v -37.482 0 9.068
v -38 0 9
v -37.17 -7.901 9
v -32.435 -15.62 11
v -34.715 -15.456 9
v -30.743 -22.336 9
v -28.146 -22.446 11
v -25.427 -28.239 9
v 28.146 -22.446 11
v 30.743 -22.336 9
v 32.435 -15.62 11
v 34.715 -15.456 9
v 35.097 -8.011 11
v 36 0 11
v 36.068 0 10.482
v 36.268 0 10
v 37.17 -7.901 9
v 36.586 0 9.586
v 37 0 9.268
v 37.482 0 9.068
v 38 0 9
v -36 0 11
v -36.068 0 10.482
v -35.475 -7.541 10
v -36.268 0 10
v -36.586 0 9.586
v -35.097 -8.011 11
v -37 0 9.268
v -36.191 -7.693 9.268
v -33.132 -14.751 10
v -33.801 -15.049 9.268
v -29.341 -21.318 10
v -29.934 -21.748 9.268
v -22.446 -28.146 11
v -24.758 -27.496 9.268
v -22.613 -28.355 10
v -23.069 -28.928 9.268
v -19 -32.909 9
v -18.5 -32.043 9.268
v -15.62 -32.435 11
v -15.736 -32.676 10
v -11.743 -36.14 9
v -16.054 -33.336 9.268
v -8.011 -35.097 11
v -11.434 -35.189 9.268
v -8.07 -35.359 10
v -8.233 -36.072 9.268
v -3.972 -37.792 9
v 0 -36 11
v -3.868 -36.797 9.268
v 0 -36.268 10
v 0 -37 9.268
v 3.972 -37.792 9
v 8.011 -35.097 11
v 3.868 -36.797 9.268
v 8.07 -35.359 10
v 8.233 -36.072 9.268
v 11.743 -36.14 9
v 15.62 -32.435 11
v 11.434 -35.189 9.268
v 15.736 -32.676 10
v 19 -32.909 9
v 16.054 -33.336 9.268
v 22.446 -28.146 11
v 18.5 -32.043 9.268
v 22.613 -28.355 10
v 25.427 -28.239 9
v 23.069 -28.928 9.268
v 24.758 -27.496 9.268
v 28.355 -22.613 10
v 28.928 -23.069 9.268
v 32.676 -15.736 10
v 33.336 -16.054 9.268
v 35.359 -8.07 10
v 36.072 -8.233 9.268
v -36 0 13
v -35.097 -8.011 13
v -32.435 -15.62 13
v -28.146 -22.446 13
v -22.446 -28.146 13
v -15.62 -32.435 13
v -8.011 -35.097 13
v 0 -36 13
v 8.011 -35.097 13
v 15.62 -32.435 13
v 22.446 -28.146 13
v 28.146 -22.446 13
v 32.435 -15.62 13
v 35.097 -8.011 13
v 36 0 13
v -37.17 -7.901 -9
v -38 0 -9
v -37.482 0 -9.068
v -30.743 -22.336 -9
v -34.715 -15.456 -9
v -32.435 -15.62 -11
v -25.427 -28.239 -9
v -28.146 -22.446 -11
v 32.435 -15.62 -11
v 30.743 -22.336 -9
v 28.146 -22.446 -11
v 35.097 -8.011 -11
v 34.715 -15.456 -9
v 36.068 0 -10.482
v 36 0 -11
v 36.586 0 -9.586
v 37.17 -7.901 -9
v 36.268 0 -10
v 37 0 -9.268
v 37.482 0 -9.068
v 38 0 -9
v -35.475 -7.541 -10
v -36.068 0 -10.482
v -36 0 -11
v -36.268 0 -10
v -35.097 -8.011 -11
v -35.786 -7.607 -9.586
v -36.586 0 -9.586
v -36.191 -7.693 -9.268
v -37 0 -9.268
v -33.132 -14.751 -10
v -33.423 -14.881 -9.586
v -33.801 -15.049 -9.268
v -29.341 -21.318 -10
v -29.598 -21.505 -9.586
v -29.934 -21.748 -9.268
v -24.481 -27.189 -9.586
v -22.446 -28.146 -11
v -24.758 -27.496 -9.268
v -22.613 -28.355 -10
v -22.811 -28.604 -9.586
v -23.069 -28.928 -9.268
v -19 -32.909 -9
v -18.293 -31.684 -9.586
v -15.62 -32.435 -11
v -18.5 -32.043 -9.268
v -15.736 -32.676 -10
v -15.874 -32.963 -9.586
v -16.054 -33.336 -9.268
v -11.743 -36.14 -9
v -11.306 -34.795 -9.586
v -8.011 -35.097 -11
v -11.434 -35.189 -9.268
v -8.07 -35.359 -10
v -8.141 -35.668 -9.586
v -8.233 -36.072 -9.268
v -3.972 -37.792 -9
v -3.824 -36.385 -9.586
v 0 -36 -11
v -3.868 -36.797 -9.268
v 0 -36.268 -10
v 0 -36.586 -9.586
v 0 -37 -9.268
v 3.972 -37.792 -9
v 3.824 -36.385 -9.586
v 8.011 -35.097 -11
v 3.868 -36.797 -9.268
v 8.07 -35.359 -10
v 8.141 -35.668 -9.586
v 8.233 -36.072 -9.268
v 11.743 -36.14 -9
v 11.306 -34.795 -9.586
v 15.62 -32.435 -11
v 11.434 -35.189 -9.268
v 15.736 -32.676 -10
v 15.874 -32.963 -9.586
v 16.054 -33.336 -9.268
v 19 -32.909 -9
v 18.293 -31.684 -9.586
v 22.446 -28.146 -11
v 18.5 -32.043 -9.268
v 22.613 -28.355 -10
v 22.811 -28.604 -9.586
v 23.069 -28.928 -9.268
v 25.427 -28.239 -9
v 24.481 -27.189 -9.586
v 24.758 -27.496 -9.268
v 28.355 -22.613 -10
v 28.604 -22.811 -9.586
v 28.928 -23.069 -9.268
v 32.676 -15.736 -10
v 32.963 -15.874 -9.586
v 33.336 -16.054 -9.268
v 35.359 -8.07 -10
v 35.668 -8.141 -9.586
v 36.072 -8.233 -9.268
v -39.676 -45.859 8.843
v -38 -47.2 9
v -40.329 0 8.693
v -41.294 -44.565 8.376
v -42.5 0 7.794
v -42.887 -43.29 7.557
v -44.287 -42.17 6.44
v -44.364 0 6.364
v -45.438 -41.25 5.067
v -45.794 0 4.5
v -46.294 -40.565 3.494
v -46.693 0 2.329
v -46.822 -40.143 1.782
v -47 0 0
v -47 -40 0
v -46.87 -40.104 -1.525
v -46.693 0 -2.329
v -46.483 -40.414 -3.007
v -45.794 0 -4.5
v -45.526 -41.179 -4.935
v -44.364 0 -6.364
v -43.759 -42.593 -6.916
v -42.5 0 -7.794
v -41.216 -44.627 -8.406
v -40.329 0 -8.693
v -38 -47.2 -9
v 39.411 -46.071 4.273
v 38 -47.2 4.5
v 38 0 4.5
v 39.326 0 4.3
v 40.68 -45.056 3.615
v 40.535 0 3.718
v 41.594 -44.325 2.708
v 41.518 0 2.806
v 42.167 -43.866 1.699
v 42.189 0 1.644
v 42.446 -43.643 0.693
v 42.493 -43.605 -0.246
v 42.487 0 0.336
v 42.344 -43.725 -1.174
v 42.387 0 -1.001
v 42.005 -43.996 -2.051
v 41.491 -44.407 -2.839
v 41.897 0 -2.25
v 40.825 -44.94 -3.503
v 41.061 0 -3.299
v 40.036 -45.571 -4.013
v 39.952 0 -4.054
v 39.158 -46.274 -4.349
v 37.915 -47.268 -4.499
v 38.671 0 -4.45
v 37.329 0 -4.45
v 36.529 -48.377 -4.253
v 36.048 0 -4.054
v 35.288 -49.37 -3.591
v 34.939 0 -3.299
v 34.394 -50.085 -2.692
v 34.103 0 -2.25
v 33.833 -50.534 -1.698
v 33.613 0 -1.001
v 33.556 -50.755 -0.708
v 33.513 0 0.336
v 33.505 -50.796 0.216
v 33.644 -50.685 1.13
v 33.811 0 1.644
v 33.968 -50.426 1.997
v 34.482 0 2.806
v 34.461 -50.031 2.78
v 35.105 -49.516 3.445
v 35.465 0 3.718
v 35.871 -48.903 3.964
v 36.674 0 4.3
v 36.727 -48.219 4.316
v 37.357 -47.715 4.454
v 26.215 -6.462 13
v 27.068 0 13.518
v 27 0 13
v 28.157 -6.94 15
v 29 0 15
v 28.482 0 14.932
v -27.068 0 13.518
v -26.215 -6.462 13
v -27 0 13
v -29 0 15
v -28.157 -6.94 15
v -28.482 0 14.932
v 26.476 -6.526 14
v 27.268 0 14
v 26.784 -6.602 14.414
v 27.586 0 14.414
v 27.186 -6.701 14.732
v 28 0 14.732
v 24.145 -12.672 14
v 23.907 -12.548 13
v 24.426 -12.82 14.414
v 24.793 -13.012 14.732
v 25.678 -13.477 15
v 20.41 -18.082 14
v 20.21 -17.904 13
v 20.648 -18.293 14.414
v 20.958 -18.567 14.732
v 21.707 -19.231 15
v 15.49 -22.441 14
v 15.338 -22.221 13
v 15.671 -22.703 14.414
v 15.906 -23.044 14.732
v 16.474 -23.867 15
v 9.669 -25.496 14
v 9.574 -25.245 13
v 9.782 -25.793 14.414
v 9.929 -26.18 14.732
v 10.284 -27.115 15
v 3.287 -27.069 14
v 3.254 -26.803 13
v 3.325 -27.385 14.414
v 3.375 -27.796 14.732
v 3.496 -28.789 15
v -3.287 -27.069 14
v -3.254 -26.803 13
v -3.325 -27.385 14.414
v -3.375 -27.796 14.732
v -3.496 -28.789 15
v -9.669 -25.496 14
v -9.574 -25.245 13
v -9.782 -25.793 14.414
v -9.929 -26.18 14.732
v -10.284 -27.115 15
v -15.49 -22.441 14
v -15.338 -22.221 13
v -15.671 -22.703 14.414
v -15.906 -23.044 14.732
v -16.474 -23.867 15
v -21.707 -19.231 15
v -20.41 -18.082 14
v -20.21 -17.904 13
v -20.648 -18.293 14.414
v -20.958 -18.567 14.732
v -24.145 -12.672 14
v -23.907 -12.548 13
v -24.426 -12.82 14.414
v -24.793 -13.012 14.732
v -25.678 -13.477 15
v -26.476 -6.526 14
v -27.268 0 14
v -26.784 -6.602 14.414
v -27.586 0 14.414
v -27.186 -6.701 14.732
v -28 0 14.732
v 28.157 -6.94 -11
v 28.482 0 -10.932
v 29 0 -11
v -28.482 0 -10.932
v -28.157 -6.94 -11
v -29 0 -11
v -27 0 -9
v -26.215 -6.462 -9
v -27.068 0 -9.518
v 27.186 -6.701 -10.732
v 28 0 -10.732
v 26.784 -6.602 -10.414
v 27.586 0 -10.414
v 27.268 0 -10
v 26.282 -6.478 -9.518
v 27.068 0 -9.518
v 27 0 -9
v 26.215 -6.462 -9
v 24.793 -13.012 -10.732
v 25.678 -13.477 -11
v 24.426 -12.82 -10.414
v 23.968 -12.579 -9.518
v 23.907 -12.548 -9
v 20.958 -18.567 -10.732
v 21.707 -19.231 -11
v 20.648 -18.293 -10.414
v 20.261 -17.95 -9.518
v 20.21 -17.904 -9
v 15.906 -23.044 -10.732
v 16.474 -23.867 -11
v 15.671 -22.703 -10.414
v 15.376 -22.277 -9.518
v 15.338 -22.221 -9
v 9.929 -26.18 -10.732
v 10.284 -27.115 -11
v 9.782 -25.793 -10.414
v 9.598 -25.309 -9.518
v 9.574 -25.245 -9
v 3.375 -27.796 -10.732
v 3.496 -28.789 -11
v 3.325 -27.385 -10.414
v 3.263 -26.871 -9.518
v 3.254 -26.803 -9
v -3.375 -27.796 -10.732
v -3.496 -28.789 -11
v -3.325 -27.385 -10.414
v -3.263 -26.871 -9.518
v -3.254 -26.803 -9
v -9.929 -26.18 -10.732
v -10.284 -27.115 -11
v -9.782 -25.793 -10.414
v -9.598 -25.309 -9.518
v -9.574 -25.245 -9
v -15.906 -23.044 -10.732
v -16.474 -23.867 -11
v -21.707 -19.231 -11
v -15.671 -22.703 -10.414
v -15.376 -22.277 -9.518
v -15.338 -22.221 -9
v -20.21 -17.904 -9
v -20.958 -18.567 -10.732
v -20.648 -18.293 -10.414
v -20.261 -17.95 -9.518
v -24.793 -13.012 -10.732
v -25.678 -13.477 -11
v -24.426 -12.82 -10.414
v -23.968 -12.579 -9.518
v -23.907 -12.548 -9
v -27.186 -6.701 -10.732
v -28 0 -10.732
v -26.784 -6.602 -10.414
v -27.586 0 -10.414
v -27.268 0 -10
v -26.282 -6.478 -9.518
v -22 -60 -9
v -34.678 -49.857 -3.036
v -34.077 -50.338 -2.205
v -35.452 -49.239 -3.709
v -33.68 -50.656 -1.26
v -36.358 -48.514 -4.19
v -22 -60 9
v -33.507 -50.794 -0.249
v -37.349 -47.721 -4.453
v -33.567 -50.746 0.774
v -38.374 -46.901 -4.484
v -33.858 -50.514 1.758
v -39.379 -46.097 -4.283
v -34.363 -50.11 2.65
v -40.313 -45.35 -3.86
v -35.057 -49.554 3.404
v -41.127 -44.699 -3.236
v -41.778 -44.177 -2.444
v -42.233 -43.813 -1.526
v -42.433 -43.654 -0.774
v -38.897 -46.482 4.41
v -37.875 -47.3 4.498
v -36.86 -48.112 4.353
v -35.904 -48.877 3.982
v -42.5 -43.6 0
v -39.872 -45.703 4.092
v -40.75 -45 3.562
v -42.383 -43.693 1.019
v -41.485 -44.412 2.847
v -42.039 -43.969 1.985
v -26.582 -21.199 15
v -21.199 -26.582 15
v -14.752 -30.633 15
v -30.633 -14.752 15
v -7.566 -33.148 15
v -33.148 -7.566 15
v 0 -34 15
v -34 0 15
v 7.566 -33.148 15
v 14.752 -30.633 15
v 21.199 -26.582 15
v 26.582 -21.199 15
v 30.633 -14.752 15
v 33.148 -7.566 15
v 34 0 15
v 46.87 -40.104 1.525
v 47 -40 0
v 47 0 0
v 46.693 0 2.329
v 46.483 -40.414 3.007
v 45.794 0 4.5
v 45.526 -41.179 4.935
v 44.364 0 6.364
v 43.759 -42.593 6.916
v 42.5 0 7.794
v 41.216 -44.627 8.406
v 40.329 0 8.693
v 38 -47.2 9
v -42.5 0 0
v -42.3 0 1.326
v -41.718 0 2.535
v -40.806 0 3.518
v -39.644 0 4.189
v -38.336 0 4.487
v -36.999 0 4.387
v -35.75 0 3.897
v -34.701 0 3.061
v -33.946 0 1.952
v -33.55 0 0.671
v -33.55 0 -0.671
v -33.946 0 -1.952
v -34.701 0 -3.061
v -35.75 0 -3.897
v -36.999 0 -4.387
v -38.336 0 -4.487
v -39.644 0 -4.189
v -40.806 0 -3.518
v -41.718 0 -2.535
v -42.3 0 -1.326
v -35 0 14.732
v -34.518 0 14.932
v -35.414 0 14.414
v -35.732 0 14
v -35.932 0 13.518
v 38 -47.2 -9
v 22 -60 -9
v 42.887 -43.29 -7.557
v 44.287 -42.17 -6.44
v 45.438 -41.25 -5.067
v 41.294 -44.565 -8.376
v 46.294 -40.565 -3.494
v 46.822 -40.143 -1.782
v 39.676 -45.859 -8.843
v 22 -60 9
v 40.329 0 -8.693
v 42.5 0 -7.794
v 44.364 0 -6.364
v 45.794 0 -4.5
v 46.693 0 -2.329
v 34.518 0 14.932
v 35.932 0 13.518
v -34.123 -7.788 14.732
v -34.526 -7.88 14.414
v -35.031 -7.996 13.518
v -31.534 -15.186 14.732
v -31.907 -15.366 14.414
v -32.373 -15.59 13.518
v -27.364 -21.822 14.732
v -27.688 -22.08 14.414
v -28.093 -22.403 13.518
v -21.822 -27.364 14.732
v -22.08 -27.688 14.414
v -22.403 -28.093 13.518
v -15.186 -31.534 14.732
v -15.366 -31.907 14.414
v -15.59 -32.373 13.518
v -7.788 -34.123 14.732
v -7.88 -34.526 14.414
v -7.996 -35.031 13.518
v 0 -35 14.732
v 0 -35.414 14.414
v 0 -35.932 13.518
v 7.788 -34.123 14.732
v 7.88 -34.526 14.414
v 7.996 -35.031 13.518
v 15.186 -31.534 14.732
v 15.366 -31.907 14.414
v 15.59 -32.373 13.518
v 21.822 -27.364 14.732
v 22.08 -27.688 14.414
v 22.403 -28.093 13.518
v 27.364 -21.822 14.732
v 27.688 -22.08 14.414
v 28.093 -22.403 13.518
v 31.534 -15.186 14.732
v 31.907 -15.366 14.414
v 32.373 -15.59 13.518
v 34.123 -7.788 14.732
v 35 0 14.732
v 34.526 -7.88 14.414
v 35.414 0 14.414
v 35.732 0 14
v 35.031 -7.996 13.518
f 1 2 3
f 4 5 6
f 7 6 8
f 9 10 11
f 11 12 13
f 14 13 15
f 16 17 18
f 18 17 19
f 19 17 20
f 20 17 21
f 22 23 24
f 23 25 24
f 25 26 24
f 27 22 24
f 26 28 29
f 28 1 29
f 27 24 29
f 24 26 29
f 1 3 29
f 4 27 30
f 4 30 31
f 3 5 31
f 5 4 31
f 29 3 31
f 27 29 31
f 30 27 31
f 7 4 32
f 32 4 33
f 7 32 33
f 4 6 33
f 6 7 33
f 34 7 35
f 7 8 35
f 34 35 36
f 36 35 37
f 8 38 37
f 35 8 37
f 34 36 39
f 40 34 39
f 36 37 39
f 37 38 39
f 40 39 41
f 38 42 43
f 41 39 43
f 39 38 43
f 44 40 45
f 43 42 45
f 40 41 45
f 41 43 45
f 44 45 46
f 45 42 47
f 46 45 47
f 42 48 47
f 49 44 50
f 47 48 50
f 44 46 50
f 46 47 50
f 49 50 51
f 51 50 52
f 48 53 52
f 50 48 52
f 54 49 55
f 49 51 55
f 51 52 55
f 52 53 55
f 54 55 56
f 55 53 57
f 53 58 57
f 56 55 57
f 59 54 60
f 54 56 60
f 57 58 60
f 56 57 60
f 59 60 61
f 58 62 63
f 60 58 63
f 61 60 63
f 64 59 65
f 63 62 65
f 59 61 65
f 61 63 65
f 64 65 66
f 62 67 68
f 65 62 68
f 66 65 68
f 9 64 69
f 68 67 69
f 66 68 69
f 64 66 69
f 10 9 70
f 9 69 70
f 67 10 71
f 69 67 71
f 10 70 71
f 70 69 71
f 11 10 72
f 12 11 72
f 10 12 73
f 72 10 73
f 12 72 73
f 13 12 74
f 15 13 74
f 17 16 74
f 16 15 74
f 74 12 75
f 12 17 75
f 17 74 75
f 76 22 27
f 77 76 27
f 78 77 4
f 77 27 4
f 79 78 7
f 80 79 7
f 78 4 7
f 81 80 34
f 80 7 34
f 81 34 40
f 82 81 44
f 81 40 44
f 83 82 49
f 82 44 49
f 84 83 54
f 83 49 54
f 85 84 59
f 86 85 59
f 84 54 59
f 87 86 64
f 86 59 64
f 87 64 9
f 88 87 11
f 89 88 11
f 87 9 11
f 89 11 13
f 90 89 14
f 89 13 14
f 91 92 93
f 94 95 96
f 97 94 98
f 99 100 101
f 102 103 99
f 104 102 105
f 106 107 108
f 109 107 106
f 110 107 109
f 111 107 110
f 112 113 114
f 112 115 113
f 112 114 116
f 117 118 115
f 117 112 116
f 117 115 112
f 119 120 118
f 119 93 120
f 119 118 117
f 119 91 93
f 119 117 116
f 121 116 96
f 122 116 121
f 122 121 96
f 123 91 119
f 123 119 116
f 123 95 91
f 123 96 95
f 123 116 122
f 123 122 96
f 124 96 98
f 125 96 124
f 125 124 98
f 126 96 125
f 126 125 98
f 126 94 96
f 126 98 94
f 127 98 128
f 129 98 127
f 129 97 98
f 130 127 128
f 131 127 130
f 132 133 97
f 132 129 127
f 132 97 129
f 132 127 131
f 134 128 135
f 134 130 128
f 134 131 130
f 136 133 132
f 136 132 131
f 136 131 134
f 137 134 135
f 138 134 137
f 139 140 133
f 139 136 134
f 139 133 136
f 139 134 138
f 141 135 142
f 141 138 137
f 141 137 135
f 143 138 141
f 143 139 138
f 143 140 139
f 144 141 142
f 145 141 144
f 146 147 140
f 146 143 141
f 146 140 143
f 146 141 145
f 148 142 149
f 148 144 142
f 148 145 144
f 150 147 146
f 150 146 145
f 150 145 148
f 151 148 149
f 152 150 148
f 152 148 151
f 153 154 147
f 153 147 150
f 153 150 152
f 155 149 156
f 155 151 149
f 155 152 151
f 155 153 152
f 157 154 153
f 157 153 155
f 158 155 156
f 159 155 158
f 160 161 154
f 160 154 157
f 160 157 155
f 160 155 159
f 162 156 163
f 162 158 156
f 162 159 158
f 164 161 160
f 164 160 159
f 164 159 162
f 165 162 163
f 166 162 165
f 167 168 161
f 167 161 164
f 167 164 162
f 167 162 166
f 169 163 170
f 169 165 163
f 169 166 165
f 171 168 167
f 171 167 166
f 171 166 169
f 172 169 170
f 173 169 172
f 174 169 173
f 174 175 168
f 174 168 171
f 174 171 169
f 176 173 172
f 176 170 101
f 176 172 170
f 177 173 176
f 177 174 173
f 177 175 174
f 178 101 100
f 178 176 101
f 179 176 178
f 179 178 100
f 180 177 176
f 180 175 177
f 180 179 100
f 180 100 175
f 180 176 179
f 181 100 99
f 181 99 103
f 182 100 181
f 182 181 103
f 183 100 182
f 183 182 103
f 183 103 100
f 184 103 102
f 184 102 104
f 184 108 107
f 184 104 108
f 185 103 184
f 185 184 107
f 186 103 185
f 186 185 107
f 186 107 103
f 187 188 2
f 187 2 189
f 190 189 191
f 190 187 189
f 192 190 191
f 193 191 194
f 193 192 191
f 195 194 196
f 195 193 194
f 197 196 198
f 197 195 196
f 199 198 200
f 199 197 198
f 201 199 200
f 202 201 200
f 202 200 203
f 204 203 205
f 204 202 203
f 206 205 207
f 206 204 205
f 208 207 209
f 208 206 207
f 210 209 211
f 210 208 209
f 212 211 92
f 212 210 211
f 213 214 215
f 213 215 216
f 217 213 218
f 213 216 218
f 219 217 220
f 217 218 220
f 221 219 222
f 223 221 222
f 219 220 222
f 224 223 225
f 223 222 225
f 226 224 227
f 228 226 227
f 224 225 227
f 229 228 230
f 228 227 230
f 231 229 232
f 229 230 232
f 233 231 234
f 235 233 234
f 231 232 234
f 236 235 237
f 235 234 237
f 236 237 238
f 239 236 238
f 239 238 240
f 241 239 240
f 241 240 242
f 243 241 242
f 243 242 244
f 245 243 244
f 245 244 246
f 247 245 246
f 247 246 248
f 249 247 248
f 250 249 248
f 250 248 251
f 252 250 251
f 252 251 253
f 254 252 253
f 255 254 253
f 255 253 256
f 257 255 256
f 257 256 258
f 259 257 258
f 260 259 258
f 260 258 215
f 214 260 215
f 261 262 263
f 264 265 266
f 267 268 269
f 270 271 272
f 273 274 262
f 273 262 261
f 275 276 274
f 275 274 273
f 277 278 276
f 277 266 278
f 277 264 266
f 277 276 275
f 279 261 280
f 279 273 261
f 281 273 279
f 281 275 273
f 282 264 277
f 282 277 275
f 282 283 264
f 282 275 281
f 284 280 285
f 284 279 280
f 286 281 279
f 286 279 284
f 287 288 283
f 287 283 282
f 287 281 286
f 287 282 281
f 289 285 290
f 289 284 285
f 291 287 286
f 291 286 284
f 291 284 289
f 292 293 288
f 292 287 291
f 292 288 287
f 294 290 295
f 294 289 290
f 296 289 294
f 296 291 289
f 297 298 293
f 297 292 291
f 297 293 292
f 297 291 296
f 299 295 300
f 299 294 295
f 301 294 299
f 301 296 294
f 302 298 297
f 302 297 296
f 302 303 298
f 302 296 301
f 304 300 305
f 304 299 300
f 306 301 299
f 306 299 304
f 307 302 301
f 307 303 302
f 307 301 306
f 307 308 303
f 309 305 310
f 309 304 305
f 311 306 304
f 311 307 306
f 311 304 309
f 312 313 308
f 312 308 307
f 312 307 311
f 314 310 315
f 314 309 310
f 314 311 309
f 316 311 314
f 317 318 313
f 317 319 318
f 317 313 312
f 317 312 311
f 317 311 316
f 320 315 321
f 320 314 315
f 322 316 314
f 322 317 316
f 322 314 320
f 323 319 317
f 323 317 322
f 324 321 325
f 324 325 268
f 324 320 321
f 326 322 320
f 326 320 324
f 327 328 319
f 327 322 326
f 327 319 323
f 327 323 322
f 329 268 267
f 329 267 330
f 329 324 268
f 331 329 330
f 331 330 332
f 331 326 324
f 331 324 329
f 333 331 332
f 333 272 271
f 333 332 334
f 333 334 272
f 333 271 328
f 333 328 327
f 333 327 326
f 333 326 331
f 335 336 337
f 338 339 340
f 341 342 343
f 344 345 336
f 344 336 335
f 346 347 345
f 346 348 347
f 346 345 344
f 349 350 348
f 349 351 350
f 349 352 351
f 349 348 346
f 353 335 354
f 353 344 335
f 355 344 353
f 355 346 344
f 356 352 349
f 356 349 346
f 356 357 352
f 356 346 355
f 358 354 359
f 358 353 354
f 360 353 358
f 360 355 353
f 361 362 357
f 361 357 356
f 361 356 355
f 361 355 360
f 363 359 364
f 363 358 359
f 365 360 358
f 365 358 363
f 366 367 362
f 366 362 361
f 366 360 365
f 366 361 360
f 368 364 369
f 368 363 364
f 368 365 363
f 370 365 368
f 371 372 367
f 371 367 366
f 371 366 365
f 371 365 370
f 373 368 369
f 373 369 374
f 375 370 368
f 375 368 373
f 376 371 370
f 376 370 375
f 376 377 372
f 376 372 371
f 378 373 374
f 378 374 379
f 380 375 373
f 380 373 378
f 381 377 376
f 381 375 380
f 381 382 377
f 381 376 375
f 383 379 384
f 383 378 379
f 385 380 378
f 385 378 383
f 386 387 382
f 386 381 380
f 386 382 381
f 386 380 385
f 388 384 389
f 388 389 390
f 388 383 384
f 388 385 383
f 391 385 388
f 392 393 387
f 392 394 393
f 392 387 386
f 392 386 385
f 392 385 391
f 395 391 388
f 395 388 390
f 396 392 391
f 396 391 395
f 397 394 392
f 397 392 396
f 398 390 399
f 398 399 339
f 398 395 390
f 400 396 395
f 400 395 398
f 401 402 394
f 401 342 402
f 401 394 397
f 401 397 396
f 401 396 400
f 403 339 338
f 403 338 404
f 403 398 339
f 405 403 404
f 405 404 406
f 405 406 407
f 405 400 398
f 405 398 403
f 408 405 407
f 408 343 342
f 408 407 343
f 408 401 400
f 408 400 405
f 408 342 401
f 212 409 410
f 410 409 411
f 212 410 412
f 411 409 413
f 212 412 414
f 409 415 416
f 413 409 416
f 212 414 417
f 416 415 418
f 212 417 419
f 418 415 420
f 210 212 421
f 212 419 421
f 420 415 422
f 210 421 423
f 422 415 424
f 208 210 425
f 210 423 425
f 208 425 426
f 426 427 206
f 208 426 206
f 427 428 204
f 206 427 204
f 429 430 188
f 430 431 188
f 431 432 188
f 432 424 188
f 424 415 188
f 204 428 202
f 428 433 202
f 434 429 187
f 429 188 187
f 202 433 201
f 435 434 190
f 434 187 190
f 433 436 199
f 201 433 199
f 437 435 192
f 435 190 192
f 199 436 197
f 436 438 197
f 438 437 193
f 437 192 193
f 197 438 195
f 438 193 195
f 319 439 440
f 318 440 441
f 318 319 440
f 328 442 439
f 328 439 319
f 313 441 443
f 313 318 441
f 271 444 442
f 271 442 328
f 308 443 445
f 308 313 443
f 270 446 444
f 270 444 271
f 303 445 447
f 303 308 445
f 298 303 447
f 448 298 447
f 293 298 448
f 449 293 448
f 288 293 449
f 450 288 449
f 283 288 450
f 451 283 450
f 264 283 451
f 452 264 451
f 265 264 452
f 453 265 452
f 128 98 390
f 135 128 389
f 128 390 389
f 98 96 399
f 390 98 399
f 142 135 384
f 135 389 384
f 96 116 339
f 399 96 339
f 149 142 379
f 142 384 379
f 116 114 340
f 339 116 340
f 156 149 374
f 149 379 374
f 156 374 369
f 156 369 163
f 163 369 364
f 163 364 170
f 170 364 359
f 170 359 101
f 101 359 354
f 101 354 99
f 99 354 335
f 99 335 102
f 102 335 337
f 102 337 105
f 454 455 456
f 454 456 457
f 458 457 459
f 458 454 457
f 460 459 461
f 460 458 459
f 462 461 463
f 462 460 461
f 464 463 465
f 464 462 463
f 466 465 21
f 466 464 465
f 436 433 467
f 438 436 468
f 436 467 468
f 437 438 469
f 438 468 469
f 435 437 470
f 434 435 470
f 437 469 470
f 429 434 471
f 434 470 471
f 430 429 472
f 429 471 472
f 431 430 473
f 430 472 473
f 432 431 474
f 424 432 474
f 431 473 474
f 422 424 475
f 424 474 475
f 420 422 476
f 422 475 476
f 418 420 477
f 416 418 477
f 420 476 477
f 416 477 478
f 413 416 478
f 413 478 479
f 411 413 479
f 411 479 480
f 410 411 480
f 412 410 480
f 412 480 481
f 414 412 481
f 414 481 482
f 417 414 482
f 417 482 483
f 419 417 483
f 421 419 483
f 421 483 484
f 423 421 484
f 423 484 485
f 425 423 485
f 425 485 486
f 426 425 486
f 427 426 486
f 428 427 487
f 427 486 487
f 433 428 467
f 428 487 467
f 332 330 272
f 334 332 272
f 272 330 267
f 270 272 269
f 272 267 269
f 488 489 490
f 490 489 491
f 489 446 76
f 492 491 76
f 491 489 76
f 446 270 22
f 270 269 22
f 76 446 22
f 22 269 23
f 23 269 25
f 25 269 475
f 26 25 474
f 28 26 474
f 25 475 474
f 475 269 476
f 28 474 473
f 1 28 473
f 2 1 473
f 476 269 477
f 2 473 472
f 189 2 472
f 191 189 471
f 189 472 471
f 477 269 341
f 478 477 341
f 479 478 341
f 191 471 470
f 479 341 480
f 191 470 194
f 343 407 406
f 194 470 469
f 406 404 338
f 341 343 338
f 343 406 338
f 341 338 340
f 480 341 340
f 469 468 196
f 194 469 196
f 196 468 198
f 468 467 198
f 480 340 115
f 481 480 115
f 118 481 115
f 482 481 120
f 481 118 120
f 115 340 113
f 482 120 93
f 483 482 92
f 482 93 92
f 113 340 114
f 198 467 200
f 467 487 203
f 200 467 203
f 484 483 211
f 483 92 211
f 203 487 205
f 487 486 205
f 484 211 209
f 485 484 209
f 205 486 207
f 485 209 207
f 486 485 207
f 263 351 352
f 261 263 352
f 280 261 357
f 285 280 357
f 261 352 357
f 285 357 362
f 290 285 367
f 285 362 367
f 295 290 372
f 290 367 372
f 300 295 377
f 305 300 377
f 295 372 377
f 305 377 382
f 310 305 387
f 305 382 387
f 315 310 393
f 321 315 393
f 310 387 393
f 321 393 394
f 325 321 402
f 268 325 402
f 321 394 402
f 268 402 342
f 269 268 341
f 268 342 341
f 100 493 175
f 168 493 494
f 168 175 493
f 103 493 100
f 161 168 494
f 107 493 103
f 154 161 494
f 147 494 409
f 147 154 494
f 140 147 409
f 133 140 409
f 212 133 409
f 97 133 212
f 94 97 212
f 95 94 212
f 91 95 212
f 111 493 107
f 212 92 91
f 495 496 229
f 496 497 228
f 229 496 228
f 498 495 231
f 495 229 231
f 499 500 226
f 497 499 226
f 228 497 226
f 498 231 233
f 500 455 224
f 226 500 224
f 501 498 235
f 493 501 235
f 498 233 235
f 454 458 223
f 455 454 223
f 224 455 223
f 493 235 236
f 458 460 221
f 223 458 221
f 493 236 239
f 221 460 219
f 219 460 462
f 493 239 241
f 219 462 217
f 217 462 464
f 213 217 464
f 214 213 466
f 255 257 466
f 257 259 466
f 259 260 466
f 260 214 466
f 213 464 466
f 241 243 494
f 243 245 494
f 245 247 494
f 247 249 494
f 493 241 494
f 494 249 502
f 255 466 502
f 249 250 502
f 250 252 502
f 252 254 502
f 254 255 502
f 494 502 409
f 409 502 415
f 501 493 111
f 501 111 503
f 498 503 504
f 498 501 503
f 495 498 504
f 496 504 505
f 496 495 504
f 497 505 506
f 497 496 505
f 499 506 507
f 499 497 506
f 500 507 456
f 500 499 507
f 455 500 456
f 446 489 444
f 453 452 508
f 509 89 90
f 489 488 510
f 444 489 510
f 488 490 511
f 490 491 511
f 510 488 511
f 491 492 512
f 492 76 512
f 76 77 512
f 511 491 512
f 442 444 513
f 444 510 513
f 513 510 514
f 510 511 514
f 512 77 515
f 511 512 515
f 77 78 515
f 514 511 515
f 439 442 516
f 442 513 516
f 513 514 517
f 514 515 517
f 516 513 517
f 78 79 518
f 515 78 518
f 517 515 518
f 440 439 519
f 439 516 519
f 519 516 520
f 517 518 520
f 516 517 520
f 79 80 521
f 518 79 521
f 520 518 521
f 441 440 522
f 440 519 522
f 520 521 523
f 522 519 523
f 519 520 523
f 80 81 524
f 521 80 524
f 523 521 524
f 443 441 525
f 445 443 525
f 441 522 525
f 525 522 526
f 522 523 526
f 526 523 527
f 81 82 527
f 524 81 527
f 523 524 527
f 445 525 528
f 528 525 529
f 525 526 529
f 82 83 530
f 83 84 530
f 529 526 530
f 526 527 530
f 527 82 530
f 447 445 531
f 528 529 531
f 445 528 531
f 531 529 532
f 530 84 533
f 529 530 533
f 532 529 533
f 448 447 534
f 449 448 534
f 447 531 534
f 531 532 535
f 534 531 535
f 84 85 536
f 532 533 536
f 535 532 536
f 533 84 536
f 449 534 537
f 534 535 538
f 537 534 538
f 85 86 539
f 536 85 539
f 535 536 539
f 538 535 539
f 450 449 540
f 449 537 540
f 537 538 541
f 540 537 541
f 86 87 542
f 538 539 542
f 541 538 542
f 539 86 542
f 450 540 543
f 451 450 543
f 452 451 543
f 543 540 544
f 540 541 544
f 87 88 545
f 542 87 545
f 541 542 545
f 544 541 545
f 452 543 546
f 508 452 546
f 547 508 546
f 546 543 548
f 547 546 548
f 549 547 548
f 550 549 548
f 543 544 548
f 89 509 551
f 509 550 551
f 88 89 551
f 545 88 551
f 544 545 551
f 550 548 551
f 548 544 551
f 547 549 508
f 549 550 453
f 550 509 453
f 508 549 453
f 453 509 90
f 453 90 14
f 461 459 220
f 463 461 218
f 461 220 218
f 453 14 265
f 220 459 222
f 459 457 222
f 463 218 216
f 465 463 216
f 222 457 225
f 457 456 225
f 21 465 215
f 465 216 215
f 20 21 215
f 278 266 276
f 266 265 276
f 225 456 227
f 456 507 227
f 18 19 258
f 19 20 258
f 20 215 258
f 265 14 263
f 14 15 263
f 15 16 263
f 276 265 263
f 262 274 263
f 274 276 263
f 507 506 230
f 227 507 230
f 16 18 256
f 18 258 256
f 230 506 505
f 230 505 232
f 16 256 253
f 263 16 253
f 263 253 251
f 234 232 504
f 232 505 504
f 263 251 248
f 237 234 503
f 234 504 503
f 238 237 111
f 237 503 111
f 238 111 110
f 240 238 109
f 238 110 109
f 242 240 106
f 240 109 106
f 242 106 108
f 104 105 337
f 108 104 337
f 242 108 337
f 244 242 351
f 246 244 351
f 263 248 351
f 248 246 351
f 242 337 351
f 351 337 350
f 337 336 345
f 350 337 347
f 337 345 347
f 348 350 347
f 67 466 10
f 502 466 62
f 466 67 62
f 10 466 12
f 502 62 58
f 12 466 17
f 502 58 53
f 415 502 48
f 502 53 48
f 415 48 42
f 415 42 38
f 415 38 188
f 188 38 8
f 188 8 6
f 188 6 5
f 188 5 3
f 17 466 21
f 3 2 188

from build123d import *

# Parameters (mm, degrees)
BOSS_EXTRUDE1_DEPTH      = 15
BOSS_EXTRUDE1_DEPTH_BACK = 11
BOSS_EXTRUDE2_DEPTH      = 9
FILLET1_START            = -60
FILLET1_DEPTH            = 60
FILLET2_START            = -60
FILLET2_DEPTH            = 60
SKETCH2_R                = 4.5
CUT_EXTRUDE1_DEPTH       = 88
FILLET3_R                = 2
FILLET4_R                = 2


with BuildPart() as part:
    # Sketch1 → Boss-Extrude1 (new, two sides: drawn at the far end of the back side and taken through both)
    with BuildSketch(Plane.XY.offset(-BOSS_EXTRUDE1_DEPTH_BACK)):
        with BuildLine():
            Line((-27, 0), (-36, 0))
            ThreePointArc((-36, 0), (0, -36), (36, 0))
            Line((36, 0), (27, 0))
            ThreePointArc((27, 0), (0, -27), (-27, 0))
        make_face()
    extrude(amount=BOSS_EXTRUDE1_DEPTH + BOSS_EXTRUDE1_DEPTH_BACK)

    # Sketch1<3> → Boss-Extrude2 (add, symmetric)
    with BuildSketch(Plane.XY):
        with BuildLine():
            ThreePointArc((-36, 0), (0, -36), (36, 0))
            Line((36, 0), (47, 0))
            Line((47, 0), (47, -40))
            Line((47, -40), (22, -60))
            Line((22, -60), (-22, -60))
            Line((-22, -60), (-47, -40))
            Line((-47, -40), (-47, 0))
            Line((-47, 0), (-36, 0))
        make_face()
    extrude(amount=BOSS_EXTRUDE2_DEPTH, both=True)

    # Fillet1: read off the stored shape, not the designer's step
    # Fillet1 outline → Fillet1 (cut)
    with BuildSketch(Plane(origin=(0, 0, 0), x_dir=(1, 0, 0), z_dir=(0, 1, 0)).offset(FILLET1_START)):
        with BuildLine():
            Line((47, 9), (38, 9))
            ThreePointArc((38, 9), (44.363961031, 6.363961031), (47, 0))
            Line((47, 0), (47, 9))
        make_face()
        with BuildLine():
            Line((47, -9), (47, 0))
            ThreePointArc((47, 0), (44.363961031, -6.363961031), (38, -9))
            Line((38, -9), (47, -9))
        make_face()
    extrude(amount=FILLET1_DEPTH, mode=Mode.SUBTRACT)

    # Fillet2: read off the stored shape, not the designer's step
    # Fillet2 outline → Fillet2 (cut)
    with BuildSketch(Plane(origin=(0, 0, 0), x_dir=(1, 0, 0), z_dir=(0, 1, 0)).offset(FILLET2_START)):
        with BuildLine():
            Line((-47, -9), (-38, -9))
            ThreePointArc((-38, -9), (-44.363961031, -6.363961031), (-47, 0))
            Line((-47, 0), (-47, -9))
        make_face()
        with BuildLine():
            Line((-47, 9), (-47, 0))
            ThreePointArc((-47, 0), (-44.363961031, 6.363961031), (-38, 9))
            Line((-38, 9), (-47, 9))
        make_face()
    extrude(amount=FILLET2_DEPTH, mode=Mode.SUBTRACT)

    # Sketch2 → Cut-Extrude1 (cut)
    with BuildSketch(Plane(origin=(0, 0, 0), x_dir=(1, 0, 0), z_dir=(0, 1, 0))):
        with Locations(Location((38, 0, 0), (0, 0, 270))):
            Circle(SKETCH2_R)
        with Locations(Location((-38, 0, 0), (0, 0, 180))):
            Circle(SKETCH2_R)
    extrude(amount=-CUT_EXTRUDE1_DEPTH, mode=Mode.SUBTRACT)

    # Fillet3
    fillet3_edges = [part.edges().sort_by_distance(p)[0] for p in [
        (0, -36, 15),
        (0, -36, -9),
        (0, -36, 9),
    ]]
    fillet(fillet3_edges, radius=FILLET3_R - 0.0001)  # a hair under: the kernel refuses the full size

    # Fillet4
    fillet4_edges = [part.edges().sort_by_distance(p)[0] for p in [
        (0, -27, 15),
        (0, -27, -11),
    ]]
    fillet(fillet4_edges, radius=FILLET4_R)


solid = part.part
